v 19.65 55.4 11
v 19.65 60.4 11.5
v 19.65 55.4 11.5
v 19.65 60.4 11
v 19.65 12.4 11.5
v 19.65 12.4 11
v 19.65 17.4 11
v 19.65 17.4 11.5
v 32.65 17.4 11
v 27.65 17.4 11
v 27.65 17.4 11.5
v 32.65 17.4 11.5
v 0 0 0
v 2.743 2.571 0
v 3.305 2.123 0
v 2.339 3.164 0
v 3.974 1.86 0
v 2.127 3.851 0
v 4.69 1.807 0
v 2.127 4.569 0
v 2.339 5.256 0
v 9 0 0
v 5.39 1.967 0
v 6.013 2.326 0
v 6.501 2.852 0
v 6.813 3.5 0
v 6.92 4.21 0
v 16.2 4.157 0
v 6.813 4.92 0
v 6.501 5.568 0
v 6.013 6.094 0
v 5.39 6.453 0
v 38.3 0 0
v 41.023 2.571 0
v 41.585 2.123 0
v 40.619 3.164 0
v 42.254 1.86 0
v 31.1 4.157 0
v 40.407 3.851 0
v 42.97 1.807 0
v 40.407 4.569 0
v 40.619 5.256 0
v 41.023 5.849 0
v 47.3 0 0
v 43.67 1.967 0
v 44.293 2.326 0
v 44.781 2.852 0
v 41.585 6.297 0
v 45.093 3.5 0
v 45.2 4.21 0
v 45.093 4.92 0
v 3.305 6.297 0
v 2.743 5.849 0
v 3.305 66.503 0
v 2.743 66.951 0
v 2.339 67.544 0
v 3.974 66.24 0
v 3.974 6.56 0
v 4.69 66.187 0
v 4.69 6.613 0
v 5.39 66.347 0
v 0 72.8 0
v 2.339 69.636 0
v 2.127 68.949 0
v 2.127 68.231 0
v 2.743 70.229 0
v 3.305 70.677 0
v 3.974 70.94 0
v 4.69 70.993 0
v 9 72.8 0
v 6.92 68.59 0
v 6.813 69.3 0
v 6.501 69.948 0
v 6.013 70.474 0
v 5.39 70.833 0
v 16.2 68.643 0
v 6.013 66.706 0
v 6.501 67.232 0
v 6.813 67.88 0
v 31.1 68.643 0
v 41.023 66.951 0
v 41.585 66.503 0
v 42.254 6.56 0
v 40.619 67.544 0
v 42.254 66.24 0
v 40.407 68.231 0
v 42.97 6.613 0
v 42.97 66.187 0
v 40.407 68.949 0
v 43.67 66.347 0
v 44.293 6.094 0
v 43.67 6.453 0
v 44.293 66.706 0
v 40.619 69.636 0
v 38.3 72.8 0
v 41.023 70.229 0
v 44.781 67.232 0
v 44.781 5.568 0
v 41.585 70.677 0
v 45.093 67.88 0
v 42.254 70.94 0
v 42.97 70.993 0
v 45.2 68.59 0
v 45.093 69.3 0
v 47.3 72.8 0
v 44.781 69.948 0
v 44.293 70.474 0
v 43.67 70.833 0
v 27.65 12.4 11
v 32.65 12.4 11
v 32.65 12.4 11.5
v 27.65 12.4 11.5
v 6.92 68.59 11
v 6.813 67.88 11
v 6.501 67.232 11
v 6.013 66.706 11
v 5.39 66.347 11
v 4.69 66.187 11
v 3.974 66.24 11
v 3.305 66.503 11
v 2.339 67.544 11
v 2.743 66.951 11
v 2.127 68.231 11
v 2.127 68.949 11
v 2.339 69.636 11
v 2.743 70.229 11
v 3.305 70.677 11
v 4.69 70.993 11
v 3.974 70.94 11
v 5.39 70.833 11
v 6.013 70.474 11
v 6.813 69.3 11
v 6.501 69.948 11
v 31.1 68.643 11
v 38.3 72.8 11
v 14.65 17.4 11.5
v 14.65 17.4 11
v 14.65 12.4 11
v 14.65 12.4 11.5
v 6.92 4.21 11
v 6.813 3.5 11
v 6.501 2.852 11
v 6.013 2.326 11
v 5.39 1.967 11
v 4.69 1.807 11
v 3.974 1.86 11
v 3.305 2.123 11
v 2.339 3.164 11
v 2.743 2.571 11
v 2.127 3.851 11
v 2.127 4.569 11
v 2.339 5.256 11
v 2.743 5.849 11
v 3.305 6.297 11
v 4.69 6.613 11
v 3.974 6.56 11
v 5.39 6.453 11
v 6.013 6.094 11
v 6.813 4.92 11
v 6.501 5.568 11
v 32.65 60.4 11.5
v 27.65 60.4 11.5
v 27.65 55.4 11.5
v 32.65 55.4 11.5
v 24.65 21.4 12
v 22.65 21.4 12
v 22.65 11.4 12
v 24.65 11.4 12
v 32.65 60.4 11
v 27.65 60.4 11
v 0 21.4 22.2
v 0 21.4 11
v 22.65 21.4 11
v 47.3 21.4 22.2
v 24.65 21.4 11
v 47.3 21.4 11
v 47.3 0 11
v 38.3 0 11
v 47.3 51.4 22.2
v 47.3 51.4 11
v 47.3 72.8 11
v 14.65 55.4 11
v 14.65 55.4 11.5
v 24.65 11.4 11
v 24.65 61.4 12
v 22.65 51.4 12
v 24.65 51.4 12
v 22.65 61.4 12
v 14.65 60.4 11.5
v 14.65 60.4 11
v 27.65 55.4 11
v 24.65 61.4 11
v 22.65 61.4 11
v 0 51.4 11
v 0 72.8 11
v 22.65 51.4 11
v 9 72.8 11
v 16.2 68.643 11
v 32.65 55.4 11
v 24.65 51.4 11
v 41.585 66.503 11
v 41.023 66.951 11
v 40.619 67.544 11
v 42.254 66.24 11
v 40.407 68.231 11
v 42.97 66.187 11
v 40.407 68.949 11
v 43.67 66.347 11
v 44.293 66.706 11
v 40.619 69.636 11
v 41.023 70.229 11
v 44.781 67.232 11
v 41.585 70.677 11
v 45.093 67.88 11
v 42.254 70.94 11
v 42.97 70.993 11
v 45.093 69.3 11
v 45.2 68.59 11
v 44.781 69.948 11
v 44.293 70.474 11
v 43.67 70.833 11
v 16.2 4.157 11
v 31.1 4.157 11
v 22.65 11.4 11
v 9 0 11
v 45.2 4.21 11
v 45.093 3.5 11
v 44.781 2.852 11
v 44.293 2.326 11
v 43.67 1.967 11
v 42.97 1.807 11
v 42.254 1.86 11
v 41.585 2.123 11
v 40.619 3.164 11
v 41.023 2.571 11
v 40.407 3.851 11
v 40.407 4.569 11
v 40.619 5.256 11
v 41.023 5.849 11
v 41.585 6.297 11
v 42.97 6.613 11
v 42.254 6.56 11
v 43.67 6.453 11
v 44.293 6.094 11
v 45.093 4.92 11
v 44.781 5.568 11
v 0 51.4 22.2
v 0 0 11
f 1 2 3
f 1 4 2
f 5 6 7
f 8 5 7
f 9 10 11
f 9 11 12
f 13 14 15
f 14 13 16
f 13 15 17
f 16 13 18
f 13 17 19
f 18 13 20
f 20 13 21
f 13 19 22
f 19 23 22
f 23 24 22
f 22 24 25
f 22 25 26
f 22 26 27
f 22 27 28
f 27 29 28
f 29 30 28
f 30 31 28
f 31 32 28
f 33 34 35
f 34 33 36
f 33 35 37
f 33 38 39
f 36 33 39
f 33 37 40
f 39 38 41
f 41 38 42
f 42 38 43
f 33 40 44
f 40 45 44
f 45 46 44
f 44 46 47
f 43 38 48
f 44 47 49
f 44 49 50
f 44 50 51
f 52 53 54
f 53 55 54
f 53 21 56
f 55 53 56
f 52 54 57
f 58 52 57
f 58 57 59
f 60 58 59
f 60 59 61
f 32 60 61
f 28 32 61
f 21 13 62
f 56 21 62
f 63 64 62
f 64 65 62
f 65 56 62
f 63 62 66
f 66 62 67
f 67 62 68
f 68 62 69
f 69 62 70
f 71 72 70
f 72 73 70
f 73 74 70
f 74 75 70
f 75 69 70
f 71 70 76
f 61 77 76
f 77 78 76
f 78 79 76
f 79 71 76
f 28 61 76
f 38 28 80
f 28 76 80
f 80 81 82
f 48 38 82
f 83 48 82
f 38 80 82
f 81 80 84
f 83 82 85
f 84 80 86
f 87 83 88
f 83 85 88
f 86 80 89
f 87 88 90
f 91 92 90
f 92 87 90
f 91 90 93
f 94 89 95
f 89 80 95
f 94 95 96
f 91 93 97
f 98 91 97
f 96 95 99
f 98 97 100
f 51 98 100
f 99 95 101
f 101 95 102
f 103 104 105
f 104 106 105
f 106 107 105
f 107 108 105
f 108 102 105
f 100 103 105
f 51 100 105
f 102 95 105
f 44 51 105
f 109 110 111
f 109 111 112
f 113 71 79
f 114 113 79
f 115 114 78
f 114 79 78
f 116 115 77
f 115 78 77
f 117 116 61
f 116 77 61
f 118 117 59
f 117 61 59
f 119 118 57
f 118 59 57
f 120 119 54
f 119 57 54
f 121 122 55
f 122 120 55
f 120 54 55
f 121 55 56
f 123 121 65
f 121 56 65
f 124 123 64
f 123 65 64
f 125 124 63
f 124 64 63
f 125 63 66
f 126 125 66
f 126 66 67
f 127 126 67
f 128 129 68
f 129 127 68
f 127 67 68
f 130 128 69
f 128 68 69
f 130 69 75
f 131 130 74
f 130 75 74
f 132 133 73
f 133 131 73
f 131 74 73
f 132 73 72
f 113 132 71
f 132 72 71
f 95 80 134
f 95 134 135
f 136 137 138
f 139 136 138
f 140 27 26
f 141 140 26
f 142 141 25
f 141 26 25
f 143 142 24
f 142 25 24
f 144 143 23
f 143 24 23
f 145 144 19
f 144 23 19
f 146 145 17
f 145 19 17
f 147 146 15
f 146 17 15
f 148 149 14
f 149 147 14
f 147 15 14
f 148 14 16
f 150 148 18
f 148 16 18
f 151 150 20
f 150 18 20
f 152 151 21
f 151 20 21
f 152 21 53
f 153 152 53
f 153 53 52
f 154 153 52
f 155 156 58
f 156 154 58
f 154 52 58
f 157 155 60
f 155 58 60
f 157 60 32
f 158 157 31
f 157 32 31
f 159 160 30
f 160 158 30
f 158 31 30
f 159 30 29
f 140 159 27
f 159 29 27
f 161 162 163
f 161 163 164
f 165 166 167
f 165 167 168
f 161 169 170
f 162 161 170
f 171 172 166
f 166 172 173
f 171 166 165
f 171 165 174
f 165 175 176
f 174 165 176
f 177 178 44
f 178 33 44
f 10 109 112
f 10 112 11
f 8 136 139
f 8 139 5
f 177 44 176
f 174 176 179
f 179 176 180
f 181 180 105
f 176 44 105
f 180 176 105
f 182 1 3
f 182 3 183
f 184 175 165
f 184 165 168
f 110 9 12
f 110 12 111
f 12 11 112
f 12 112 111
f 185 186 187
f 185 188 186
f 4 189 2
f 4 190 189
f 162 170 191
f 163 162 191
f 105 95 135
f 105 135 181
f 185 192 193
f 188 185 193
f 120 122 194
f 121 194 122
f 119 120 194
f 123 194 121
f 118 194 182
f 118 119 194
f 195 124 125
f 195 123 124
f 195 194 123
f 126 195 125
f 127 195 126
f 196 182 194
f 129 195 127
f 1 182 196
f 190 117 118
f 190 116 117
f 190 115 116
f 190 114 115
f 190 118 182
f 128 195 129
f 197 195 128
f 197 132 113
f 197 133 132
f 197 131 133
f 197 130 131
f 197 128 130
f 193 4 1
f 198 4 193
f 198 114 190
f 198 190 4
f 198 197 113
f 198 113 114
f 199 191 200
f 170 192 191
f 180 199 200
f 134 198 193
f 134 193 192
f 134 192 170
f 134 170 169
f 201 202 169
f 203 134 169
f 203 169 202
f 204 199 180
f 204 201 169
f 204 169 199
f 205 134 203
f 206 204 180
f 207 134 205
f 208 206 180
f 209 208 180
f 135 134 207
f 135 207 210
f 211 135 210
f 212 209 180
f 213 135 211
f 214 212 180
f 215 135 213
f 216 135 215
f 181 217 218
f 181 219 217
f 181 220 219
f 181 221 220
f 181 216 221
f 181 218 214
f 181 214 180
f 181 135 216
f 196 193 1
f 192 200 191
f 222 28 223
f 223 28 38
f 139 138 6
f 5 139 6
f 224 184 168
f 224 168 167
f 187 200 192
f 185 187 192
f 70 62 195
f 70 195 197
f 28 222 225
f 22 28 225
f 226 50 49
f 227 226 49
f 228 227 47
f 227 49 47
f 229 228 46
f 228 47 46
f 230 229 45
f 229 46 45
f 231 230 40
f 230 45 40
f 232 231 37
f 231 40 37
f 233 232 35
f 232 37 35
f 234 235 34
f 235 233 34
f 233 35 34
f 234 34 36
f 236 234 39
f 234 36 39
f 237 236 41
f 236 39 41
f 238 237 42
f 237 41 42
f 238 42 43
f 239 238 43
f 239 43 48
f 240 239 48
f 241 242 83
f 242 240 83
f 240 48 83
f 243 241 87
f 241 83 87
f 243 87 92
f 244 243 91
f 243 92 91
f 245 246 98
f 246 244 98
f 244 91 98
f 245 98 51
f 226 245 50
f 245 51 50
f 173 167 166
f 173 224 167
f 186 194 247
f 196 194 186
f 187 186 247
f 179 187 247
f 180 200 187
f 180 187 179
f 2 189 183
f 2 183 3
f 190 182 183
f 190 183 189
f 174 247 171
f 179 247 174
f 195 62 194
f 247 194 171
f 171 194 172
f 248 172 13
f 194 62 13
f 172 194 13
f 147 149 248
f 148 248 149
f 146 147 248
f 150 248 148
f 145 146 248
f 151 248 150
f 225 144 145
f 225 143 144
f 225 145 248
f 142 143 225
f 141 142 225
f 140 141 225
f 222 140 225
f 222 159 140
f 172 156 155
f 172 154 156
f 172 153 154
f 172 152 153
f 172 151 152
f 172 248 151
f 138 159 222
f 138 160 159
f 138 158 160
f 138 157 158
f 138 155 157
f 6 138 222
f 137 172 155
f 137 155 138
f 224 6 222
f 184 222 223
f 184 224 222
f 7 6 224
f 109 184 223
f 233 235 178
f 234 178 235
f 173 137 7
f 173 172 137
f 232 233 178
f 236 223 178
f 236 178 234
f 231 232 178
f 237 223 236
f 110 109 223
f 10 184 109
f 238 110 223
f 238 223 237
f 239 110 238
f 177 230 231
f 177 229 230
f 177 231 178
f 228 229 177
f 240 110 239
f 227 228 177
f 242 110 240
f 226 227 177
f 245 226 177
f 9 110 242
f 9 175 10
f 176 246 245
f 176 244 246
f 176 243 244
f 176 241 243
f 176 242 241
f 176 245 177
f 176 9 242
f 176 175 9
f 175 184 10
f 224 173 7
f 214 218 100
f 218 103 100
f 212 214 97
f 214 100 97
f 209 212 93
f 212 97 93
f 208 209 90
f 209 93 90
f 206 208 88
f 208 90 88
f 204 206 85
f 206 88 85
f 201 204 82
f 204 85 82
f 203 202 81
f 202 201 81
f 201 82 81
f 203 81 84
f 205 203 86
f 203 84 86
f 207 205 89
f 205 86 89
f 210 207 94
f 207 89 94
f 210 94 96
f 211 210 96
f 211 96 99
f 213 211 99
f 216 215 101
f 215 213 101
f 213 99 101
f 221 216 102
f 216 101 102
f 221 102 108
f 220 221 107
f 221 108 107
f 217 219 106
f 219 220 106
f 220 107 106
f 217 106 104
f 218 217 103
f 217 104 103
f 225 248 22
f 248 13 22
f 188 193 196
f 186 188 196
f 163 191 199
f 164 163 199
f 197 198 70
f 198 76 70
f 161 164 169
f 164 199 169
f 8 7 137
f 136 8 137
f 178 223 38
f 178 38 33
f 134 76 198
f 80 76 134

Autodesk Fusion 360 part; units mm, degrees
sketch "Sketch1" plane through (0, 0, 0) normal (0, 0, 1) x (1, 0, 0)
  line L0 (47.3, 0) -> (47.3, 72.8)
  line L1 (0, 72.8) -> (0, 0)
  circle A0 centre (4.51, 4.21) radius 2.41
  line L2 (0, 36.4) -> (47.3, 36.4) construction
  line L3 (0, 21.4) -> (47.3, 21.4)
  line L4 (23.65, 72.8) -> (23.65, -0.0931) construction
  line L5 (16.2, 4.1569) -> (31.1, 4.1569)
  line L6 (16.2, 4.1569) -> (9, 0)
  line L7 (31.1, 4.1569) -> (38.3, 0)
  circle A1 centre (42.79, 4.21) radius 2.41
  line L8 (0, 0) -> (9, 0)
  line L9 (38.3, 0) -> (47.3, 0)
  line L10 (0, 72.8) -> (47.3, 72.8) construction
  line L11 (22.65, 21.4) -> (24.65, 21.4)
  line L12 (24.65, 21.4) -> (24.65, 11.4)
  line L13 (24.65, 11.4) -> (22.65, 11.4)
  line L14 (22.65, 11.4) -> (22.65, 21.4)
  line L15 (19.65, 17.4) -> (14.65, 17.4)
  line L16 (14.65, 17.4) -> (14.65, 12.4)
  line L17 (14.65, 12.4) -> (19.65, 12.4)
  line L18 (19.65, 12.4) -> (19.65, 17.4)
  line L19 (32.65, 12.4) -> (27.65, 12.4)
  line L20 (27.65, 12.4) -> (27.65, 17.4)
  line L21 (32.65, 17.4) -> (32.65, 12.4)
  line L22 (27.65, 17.4) -> (32.65, 17.4)
  line L23 (16.2, 68.6431) -> (31.1, 68.6431)
  line L24 (14.65, 55.4) -> (14.65, 60.4)
  line L25 (38.3, 72.8) -> (47.3, 72.8)
  line L26 (24.65, 51.4) -> (24.65, 61.4)
  line L27 (27.65, 60.4) -> (27.65, 55.4)
  line L28 (22.65, 61.4) -> (22.65, 51.4)
  line L29 (16.2, 68.6431) -> (9, 72.8)
  line L30 (19.65, 60.4) -> (19.65, 55.4)
  line L31 (32.65, 60.4) -> (27.65, 60.4)
  line L32 (31.1, 68.6431) -> (38.3, 72.8)
  line L33 (19.65, 55.4) -> (14.65, 55.4)
  line L34 (14.65, 60.4) -> (19.65, 60.4)
  line L35 (24.65, 61.4) -> (22.65, 61.4)
  circle A2 centre (42.79, 68.59) radius 2.41
  line L36 (32.65, 55.4) -> (32.65, 60.4)
  line L37 (0, 72.8) -> (9, 72.8)
  line L38 (23.65, 0) -> (23.65, 72.8931) construction
  line L39 (27.65, 55.4) -> (32.65, 55.4)
  circle A3 centre (4.51, 68.59) radius 2.41
  line L40 (0, 51.4) -> (47.3, 51.4)
  point P0 (23.65, 4.1569)
  point P1 (23.65, 21.4)
  point P2 (0, 72.8)
  point P3 (23.65, 68.6431)
  dimension "d1" = 47.3
  dimension "d2" = 72.8
  dimension "d3" = 4.82
  dimension "d4" = 4.51
  dimension "d5" = 4.21
  dimension "d6" = 15
  dimension "d7" = 16.2
  dimension "d8" = 4.25
  dimension "d9" = 30
  dimension "d10" = 9
  dimension "d11" = 2
  dimension "d12" = 10
  dimension "d13" = 5
  dimension "d14" = 5
  dimension "d15" = 4
  dimension "d16" = 4
extrude "Extrude1" add sketch "Sketch1" along normal blind 22.2 contours L0 L1 L3 L11 L40
extrude "Extrude2" add sketch "Sketch1" along normal blind 12 contours L3 L11 L12 L13 L14 | L26 L28 L35 L40
extrude "Extrude3" add sketch "Sketch1" along normal blind 11 contours L0 L1 L3 L5 L6 L7 L8 L9 L12 L13 L14 | L0 L1 L23 L25 L26 L28 L29 L32 L35 L37 L40
extrude "Extrude4" add sketch "Sketch1" along normal blind 11.5 contours L15 L16 L17 L18 | L19 L20 L21 L22 | L24 L30 L33 L34 | L27 L31 L36 L39
equation "d4 = ( 4.82 / 2 ) * 1 mm + 2.1 mm"
equation "d5 = ( 4.82 / 2 ) * 1 mm + 1.8 mm"
